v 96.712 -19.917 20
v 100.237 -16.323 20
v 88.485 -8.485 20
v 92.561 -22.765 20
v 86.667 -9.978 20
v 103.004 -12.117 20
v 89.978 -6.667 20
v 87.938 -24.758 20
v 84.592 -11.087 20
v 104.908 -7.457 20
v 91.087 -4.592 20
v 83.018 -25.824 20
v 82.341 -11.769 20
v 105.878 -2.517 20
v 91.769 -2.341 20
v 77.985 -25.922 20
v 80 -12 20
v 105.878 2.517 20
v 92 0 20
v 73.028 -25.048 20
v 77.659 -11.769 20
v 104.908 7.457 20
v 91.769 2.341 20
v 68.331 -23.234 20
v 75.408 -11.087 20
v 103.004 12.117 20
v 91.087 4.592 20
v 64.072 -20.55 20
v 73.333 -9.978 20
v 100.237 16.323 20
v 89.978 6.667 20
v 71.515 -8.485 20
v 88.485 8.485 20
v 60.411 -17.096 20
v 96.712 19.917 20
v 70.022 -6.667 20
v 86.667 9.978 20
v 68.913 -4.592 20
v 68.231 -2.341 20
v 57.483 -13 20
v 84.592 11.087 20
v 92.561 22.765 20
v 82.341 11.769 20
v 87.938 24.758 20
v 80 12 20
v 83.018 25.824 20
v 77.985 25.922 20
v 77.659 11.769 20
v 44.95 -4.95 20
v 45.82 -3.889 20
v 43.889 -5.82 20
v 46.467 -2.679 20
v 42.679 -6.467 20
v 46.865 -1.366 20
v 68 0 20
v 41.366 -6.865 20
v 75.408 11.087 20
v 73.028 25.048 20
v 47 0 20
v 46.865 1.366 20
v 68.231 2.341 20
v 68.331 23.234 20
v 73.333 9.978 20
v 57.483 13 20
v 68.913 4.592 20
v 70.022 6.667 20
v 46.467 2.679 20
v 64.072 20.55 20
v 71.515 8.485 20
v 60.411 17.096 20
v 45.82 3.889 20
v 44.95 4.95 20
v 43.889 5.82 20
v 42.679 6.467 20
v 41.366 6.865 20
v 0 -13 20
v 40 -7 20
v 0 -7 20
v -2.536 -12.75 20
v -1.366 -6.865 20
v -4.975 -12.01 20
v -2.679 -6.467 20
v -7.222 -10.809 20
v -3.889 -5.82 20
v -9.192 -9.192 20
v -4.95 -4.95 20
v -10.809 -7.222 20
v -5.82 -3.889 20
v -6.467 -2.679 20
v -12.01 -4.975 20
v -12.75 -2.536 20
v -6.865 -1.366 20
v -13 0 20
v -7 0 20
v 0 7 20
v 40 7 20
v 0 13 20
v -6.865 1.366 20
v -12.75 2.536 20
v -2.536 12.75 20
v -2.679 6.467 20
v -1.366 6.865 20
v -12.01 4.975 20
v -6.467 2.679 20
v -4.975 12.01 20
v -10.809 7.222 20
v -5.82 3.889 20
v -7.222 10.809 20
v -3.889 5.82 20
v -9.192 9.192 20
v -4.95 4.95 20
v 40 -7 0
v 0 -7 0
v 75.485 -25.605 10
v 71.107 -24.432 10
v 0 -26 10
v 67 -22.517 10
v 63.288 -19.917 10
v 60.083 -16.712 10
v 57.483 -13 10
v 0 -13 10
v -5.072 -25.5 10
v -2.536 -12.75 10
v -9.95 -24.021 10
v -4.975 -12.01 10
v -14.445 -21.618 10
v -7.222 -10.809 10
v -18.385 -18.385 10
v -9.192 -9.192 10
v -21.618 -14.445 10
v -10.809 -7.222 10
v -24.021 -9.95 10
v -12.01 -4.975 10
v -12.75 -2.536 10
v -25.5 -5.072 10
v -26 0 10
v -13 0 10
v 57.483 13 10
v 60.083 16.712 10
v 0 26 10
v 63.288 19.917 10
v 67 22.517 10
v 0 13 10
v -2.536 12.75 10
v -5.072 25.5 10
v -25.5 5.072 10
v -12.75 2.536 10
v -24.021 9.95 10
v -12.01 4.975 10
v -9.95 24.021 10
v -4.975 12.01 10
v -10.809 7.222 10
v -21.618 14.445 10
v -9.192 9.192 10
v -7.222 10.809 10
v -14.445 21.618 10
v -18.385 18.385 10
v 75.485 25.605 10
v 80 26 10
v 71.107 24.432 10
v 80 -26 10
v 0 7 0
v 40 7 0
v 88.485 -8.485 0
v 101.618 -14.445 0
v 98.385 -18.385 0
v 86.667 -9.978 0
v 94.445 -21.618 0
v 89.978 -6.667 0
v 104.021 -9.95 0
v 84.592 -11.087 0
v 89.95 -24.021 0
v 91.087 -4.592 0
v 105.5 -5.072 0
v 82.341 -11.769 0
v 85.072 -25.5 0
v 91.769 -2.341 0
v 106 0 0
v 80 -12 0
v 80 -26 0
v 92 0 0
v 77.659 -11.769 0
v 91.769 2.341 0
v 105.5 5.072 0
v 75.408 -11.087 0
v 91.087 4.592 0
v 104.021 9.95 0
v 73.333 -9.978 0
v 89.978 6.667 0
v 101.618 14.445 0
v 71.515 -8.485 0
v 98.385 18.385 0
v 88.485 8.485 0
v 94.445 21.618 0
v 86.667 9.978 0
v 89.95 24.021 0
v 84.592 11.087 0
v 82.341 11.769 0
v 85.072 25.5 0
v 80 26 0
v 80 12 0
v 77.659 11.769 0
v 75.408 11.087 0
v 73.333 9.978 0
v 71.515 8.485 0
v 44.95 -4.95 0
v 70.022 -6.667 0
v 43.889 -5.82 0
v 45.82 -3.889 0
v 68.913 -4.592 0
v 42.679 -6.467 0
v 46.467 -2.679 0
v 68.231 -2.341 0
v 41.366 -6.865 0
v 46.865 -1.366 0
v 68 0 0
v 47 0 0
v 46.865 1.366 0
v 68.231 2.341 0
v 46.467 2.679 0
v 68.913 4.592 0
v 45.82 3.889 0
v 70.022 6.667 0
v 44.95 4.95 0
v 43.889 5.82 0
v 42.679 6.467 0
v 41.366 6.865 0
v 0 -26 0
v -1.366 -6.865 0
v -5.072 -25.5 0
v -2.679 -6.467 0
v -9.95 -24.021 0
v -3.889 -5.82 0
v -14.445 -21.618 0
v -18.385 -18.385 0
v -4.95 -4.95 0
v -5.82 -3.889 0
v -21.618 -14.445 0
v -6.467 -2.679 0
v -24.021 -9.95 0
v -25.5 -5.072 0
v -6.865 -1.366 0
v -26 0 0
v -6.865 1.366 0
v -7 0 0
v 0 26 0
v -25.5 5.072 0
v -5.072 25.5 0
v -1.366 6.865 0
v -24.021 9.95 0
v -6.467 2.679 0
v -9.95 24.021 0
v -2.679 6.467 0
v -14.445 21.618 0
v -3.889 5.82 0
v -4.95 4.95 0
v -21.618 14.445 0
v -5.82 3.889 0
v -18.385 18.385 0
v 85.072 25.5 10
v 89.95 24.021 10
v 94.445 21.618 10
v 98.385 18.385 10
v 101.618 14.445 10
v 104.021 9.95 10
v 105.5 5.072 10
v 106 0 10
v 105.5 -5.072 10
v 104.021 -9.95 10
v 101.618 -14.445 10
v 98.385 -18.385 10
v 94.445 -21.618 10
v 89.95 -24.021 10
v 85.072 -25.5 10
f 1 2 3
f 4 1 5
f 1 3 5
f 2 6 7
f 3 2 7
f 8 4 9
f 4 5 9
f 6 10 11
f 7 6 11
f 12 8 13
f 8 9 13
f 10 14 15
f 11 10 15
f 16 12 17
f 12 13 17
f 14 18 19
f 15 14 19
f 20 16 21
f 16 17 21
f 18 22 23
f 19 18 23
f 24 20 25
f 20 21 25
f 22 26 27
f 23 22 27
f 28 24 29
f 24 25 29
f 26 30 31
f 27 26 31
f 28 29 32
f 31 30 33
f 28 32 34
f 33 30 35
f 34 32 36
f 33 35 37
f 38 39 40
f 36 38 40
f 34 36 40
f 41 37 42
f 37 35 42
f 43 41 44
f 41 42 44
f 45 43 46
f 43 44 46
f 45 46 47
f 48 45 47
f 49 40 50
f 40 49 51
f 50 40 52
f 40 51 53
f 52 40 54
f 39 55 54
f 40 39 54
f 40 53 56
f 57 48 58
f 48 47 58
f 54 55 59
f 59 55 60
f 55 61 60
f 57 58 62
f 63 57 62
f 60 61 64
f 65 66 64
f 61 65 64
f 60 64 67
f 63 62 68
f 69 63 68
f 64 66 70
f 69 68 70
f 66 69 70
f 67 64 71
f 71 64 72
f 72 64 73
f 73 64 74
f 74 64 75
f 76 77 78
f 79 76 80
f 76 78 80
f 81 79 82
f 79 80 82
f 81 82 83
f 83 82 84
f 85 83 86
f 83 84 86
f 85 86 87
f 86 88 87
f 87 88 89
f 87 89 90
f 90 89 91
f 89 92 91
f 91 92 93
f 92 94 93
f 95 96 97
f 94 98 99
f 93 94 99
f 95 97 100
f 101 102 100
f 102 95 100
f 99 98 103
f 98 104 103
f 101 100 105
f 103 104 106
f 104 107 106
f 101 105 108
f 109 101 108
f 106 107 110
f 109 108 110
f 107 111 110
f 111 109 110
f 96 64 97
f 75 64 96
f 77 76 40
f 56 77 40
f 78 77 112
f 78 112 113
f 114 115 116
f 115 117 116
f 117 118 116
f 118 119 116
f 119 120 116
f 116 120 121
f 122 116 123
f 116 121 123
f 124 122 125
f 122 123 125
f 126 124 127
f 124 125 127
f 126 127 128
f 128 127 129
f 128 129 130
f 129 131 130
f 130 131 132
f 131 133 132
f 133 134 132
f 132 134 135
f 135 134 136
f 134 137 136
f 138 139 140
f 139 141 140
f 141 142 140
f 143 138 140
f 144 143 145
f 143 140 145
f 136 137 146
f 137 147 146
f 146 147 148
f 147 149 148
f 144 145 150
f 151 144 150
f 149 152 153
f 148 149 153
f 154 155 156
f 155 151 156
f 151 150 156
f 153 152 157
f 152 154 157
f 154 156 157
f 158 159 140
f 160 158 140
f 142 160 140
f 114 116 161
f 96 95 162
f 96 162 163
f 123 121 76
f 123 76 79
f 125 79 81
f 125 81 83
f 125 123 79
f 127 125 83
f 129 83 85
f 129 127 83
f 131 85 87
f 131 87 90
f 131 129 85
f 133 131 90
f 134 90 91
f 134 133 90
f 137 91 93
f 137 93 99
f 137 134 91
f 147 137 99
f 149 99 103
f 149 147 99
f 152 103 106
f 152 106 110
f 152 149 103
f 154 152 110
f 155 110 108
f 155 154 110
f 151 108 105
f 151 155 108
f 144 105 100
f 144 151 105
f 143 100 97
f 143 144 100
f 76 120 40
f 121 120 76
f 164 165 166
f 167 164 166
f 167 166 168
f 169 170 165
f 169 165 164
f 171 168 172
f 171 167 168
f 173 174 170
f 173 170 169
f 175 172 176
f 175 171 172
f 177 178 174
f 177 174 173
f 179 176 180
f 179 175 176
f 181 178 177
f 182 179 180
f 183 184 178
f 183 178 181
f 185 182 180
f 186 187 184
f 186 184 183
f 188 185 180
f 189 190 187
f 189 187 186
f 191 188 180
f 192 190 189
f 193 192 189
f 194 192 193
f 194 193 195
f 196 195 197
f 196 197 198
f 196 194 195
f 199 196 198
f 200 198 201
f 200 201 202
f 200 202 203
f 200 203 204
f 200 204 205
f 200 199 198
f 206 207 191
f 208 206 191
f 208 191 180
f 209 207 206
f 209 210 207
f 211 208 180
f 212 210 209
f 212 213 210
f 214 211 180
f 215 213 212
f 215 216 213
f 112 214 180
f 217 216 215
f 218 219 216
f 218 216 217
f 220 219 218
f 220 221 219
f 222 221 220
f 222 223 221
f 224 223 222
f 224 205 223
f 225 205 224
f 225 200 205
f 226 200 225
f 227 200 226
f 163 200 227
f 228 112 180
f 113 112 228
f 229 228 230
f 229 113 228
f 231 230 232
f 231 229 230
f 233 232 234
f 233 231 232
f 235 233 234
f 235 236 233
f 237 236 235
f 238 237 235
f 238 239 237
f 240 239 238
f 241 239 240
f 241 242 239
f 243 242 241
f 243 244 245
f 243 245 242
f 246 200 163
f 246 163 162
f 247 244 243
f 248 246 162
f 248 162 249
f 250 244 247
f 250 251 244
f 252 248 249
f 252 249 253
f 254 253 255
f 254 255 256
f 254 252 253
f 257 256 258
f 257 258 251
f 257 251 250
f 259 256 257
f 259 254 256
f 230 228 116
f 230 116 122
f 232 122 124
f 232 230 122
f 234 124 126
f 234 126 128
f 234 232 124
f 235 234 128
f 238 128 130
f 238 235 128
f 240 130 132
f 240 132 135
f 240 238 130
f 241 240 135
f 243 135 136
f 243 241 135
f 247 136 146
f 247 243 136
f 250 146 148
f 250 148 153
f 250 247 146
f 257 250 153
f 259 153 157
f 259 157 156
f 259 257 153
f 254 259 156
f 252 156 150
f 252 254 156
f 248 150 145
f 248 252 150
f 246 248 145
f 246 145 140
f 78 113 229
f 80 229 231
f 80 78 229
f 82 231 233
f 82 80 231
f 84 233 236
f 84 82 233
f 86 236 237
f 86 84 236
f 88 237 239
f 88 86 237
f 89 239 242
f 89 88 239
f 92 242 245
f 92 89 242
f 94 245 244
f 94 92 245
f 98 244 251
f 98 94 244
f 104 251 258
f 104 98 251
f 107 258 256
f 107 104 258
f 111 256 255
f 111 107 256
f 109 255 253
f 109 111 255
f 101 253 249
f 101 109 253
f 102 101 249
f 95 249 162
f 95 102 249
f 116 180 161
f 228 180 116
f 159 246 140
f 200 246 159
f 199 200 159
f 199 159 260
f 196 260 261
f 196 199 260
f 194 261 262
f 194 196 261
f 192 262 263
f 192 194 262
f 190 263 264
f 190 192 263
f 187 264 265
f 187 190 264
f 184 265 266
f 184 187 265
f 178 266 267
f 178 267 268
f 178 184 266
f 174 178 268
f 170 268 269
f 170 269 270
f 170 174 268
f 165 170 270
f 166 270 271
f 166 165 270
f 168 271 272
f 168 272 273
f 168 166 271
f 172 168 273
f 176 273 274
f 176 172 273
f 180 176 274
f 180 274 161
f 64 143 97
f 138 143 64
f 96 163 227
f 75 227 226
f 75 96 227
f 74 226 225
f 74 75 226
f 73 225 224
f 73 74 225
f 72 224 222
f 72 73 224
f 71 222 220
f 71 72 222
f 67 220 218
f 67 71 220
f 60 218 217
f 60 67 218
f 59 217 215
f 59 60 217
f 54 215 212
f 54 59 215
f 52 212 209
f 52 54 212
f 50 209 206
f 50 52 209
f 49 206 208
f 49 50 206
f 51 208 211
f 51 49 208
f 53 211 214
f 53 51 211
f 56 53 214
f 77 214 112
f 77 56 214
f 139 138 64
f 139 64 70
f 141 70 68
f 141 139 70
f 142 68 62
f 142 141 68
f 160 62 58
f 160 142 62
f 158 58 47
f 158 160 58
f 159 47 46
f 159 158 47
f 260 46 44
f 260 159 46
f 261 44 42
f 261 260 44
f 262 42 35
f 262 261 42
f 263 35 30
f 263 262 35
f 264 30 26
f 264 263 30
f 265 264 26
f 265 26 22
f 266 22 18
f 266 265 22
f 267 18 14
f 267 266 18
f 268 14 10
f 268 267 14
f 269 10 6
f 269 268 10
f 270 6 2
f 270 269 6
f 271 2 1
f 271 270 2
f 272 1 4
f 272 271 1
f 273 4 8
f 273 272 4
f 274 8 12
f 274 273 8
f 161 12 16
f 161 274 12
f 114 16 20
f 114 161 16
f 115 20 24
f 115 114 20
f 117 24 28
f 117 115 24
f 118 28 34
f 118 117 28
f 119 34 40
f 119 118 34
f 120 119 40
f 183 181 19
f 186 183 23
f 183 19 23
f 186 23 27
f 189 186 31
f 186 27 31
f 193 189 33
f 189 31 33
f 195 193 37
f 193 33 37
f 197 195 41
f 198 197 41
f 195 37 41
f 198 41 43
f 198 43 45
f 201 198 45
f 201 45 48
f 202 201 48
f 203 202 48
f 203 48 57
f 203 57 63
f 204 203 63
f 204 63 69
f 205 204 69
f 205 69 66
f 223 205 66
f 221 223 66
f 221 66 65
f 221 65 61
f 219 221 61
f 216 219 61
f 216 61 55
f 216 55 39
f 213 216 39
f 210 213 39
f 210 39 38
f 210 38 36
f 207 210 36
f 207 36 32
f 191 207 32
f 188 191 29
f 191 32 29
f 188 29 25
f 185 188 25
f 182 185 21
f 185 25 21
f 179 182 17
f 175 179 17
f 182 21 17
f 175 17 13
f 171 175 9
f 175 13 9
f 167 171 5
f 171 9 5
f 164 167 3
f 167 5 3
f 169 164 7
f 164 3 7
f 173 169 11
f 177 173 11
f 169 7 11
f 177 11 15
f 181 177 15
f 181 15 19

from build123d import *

# Parameters (mm, degrees)
RESSALTO_EXTRUS_O1_DEPTH = 10
RESSALTO_EXTRUS_O2_DEPTH = 10
ESBO_O3_R                = 12
CORTE_EXTRUS_O1_DEPTH    = 21


with BuildPart() as part:
    # Esboço1 → Ressalto-extrusão1 (new body)
    with BuildSketch(Plane.XY):
        with BuildLine():
            Line((0, 26), (80, 26))
            ThreePointArc((80, 26), (106, 0), (80, -26))
            Line((80, -26), (0, -26))
            ThreePointArc((0, -26), (-26, 0), (0, 26))
        make_face()
    extrude(amount=RESSALTO_EXTRUS_O1_DEPTH)

    # Esboço2 → Ressalto-extrusão2 (add)
    with BuildSketch(Plane.XY.offset(10)):
        with BuildLine():
            Line((0, 13), (57.483339502, 13))
            ThreePointArc((57.483339502, 13), (106, 0), (57.483339502, -13))
            Line((57.483339502, -13), (0, -13))
            ThreePointArc((0, -13), (-13, 0), (0, 13))
        make_face()
    extrude(amount=RESSALTO_EXTRUS_O2_DEPTH)

    # Esboço3 → Corte-extrusão1 (cut, through all)
    with BuildSketch(Plane.XY.offset(20)):
        with Locations((80, 0)):
            Circle(ESBO_O3_R)
        with BuildLine():
            Line((0, 7), (40, 7))
            ThreePointArc((40, 7), (47, 0), (40, -7))
            Line((40, -7), (0, -7))
            ThreePointArc((0, -7), (-7, 0), (0, 7))
        make_face()
    extrude(amount=-CORTE_EXTRUS_O1_DEPTH, mode=Mode.SUBTRACT)


solid = part.part
